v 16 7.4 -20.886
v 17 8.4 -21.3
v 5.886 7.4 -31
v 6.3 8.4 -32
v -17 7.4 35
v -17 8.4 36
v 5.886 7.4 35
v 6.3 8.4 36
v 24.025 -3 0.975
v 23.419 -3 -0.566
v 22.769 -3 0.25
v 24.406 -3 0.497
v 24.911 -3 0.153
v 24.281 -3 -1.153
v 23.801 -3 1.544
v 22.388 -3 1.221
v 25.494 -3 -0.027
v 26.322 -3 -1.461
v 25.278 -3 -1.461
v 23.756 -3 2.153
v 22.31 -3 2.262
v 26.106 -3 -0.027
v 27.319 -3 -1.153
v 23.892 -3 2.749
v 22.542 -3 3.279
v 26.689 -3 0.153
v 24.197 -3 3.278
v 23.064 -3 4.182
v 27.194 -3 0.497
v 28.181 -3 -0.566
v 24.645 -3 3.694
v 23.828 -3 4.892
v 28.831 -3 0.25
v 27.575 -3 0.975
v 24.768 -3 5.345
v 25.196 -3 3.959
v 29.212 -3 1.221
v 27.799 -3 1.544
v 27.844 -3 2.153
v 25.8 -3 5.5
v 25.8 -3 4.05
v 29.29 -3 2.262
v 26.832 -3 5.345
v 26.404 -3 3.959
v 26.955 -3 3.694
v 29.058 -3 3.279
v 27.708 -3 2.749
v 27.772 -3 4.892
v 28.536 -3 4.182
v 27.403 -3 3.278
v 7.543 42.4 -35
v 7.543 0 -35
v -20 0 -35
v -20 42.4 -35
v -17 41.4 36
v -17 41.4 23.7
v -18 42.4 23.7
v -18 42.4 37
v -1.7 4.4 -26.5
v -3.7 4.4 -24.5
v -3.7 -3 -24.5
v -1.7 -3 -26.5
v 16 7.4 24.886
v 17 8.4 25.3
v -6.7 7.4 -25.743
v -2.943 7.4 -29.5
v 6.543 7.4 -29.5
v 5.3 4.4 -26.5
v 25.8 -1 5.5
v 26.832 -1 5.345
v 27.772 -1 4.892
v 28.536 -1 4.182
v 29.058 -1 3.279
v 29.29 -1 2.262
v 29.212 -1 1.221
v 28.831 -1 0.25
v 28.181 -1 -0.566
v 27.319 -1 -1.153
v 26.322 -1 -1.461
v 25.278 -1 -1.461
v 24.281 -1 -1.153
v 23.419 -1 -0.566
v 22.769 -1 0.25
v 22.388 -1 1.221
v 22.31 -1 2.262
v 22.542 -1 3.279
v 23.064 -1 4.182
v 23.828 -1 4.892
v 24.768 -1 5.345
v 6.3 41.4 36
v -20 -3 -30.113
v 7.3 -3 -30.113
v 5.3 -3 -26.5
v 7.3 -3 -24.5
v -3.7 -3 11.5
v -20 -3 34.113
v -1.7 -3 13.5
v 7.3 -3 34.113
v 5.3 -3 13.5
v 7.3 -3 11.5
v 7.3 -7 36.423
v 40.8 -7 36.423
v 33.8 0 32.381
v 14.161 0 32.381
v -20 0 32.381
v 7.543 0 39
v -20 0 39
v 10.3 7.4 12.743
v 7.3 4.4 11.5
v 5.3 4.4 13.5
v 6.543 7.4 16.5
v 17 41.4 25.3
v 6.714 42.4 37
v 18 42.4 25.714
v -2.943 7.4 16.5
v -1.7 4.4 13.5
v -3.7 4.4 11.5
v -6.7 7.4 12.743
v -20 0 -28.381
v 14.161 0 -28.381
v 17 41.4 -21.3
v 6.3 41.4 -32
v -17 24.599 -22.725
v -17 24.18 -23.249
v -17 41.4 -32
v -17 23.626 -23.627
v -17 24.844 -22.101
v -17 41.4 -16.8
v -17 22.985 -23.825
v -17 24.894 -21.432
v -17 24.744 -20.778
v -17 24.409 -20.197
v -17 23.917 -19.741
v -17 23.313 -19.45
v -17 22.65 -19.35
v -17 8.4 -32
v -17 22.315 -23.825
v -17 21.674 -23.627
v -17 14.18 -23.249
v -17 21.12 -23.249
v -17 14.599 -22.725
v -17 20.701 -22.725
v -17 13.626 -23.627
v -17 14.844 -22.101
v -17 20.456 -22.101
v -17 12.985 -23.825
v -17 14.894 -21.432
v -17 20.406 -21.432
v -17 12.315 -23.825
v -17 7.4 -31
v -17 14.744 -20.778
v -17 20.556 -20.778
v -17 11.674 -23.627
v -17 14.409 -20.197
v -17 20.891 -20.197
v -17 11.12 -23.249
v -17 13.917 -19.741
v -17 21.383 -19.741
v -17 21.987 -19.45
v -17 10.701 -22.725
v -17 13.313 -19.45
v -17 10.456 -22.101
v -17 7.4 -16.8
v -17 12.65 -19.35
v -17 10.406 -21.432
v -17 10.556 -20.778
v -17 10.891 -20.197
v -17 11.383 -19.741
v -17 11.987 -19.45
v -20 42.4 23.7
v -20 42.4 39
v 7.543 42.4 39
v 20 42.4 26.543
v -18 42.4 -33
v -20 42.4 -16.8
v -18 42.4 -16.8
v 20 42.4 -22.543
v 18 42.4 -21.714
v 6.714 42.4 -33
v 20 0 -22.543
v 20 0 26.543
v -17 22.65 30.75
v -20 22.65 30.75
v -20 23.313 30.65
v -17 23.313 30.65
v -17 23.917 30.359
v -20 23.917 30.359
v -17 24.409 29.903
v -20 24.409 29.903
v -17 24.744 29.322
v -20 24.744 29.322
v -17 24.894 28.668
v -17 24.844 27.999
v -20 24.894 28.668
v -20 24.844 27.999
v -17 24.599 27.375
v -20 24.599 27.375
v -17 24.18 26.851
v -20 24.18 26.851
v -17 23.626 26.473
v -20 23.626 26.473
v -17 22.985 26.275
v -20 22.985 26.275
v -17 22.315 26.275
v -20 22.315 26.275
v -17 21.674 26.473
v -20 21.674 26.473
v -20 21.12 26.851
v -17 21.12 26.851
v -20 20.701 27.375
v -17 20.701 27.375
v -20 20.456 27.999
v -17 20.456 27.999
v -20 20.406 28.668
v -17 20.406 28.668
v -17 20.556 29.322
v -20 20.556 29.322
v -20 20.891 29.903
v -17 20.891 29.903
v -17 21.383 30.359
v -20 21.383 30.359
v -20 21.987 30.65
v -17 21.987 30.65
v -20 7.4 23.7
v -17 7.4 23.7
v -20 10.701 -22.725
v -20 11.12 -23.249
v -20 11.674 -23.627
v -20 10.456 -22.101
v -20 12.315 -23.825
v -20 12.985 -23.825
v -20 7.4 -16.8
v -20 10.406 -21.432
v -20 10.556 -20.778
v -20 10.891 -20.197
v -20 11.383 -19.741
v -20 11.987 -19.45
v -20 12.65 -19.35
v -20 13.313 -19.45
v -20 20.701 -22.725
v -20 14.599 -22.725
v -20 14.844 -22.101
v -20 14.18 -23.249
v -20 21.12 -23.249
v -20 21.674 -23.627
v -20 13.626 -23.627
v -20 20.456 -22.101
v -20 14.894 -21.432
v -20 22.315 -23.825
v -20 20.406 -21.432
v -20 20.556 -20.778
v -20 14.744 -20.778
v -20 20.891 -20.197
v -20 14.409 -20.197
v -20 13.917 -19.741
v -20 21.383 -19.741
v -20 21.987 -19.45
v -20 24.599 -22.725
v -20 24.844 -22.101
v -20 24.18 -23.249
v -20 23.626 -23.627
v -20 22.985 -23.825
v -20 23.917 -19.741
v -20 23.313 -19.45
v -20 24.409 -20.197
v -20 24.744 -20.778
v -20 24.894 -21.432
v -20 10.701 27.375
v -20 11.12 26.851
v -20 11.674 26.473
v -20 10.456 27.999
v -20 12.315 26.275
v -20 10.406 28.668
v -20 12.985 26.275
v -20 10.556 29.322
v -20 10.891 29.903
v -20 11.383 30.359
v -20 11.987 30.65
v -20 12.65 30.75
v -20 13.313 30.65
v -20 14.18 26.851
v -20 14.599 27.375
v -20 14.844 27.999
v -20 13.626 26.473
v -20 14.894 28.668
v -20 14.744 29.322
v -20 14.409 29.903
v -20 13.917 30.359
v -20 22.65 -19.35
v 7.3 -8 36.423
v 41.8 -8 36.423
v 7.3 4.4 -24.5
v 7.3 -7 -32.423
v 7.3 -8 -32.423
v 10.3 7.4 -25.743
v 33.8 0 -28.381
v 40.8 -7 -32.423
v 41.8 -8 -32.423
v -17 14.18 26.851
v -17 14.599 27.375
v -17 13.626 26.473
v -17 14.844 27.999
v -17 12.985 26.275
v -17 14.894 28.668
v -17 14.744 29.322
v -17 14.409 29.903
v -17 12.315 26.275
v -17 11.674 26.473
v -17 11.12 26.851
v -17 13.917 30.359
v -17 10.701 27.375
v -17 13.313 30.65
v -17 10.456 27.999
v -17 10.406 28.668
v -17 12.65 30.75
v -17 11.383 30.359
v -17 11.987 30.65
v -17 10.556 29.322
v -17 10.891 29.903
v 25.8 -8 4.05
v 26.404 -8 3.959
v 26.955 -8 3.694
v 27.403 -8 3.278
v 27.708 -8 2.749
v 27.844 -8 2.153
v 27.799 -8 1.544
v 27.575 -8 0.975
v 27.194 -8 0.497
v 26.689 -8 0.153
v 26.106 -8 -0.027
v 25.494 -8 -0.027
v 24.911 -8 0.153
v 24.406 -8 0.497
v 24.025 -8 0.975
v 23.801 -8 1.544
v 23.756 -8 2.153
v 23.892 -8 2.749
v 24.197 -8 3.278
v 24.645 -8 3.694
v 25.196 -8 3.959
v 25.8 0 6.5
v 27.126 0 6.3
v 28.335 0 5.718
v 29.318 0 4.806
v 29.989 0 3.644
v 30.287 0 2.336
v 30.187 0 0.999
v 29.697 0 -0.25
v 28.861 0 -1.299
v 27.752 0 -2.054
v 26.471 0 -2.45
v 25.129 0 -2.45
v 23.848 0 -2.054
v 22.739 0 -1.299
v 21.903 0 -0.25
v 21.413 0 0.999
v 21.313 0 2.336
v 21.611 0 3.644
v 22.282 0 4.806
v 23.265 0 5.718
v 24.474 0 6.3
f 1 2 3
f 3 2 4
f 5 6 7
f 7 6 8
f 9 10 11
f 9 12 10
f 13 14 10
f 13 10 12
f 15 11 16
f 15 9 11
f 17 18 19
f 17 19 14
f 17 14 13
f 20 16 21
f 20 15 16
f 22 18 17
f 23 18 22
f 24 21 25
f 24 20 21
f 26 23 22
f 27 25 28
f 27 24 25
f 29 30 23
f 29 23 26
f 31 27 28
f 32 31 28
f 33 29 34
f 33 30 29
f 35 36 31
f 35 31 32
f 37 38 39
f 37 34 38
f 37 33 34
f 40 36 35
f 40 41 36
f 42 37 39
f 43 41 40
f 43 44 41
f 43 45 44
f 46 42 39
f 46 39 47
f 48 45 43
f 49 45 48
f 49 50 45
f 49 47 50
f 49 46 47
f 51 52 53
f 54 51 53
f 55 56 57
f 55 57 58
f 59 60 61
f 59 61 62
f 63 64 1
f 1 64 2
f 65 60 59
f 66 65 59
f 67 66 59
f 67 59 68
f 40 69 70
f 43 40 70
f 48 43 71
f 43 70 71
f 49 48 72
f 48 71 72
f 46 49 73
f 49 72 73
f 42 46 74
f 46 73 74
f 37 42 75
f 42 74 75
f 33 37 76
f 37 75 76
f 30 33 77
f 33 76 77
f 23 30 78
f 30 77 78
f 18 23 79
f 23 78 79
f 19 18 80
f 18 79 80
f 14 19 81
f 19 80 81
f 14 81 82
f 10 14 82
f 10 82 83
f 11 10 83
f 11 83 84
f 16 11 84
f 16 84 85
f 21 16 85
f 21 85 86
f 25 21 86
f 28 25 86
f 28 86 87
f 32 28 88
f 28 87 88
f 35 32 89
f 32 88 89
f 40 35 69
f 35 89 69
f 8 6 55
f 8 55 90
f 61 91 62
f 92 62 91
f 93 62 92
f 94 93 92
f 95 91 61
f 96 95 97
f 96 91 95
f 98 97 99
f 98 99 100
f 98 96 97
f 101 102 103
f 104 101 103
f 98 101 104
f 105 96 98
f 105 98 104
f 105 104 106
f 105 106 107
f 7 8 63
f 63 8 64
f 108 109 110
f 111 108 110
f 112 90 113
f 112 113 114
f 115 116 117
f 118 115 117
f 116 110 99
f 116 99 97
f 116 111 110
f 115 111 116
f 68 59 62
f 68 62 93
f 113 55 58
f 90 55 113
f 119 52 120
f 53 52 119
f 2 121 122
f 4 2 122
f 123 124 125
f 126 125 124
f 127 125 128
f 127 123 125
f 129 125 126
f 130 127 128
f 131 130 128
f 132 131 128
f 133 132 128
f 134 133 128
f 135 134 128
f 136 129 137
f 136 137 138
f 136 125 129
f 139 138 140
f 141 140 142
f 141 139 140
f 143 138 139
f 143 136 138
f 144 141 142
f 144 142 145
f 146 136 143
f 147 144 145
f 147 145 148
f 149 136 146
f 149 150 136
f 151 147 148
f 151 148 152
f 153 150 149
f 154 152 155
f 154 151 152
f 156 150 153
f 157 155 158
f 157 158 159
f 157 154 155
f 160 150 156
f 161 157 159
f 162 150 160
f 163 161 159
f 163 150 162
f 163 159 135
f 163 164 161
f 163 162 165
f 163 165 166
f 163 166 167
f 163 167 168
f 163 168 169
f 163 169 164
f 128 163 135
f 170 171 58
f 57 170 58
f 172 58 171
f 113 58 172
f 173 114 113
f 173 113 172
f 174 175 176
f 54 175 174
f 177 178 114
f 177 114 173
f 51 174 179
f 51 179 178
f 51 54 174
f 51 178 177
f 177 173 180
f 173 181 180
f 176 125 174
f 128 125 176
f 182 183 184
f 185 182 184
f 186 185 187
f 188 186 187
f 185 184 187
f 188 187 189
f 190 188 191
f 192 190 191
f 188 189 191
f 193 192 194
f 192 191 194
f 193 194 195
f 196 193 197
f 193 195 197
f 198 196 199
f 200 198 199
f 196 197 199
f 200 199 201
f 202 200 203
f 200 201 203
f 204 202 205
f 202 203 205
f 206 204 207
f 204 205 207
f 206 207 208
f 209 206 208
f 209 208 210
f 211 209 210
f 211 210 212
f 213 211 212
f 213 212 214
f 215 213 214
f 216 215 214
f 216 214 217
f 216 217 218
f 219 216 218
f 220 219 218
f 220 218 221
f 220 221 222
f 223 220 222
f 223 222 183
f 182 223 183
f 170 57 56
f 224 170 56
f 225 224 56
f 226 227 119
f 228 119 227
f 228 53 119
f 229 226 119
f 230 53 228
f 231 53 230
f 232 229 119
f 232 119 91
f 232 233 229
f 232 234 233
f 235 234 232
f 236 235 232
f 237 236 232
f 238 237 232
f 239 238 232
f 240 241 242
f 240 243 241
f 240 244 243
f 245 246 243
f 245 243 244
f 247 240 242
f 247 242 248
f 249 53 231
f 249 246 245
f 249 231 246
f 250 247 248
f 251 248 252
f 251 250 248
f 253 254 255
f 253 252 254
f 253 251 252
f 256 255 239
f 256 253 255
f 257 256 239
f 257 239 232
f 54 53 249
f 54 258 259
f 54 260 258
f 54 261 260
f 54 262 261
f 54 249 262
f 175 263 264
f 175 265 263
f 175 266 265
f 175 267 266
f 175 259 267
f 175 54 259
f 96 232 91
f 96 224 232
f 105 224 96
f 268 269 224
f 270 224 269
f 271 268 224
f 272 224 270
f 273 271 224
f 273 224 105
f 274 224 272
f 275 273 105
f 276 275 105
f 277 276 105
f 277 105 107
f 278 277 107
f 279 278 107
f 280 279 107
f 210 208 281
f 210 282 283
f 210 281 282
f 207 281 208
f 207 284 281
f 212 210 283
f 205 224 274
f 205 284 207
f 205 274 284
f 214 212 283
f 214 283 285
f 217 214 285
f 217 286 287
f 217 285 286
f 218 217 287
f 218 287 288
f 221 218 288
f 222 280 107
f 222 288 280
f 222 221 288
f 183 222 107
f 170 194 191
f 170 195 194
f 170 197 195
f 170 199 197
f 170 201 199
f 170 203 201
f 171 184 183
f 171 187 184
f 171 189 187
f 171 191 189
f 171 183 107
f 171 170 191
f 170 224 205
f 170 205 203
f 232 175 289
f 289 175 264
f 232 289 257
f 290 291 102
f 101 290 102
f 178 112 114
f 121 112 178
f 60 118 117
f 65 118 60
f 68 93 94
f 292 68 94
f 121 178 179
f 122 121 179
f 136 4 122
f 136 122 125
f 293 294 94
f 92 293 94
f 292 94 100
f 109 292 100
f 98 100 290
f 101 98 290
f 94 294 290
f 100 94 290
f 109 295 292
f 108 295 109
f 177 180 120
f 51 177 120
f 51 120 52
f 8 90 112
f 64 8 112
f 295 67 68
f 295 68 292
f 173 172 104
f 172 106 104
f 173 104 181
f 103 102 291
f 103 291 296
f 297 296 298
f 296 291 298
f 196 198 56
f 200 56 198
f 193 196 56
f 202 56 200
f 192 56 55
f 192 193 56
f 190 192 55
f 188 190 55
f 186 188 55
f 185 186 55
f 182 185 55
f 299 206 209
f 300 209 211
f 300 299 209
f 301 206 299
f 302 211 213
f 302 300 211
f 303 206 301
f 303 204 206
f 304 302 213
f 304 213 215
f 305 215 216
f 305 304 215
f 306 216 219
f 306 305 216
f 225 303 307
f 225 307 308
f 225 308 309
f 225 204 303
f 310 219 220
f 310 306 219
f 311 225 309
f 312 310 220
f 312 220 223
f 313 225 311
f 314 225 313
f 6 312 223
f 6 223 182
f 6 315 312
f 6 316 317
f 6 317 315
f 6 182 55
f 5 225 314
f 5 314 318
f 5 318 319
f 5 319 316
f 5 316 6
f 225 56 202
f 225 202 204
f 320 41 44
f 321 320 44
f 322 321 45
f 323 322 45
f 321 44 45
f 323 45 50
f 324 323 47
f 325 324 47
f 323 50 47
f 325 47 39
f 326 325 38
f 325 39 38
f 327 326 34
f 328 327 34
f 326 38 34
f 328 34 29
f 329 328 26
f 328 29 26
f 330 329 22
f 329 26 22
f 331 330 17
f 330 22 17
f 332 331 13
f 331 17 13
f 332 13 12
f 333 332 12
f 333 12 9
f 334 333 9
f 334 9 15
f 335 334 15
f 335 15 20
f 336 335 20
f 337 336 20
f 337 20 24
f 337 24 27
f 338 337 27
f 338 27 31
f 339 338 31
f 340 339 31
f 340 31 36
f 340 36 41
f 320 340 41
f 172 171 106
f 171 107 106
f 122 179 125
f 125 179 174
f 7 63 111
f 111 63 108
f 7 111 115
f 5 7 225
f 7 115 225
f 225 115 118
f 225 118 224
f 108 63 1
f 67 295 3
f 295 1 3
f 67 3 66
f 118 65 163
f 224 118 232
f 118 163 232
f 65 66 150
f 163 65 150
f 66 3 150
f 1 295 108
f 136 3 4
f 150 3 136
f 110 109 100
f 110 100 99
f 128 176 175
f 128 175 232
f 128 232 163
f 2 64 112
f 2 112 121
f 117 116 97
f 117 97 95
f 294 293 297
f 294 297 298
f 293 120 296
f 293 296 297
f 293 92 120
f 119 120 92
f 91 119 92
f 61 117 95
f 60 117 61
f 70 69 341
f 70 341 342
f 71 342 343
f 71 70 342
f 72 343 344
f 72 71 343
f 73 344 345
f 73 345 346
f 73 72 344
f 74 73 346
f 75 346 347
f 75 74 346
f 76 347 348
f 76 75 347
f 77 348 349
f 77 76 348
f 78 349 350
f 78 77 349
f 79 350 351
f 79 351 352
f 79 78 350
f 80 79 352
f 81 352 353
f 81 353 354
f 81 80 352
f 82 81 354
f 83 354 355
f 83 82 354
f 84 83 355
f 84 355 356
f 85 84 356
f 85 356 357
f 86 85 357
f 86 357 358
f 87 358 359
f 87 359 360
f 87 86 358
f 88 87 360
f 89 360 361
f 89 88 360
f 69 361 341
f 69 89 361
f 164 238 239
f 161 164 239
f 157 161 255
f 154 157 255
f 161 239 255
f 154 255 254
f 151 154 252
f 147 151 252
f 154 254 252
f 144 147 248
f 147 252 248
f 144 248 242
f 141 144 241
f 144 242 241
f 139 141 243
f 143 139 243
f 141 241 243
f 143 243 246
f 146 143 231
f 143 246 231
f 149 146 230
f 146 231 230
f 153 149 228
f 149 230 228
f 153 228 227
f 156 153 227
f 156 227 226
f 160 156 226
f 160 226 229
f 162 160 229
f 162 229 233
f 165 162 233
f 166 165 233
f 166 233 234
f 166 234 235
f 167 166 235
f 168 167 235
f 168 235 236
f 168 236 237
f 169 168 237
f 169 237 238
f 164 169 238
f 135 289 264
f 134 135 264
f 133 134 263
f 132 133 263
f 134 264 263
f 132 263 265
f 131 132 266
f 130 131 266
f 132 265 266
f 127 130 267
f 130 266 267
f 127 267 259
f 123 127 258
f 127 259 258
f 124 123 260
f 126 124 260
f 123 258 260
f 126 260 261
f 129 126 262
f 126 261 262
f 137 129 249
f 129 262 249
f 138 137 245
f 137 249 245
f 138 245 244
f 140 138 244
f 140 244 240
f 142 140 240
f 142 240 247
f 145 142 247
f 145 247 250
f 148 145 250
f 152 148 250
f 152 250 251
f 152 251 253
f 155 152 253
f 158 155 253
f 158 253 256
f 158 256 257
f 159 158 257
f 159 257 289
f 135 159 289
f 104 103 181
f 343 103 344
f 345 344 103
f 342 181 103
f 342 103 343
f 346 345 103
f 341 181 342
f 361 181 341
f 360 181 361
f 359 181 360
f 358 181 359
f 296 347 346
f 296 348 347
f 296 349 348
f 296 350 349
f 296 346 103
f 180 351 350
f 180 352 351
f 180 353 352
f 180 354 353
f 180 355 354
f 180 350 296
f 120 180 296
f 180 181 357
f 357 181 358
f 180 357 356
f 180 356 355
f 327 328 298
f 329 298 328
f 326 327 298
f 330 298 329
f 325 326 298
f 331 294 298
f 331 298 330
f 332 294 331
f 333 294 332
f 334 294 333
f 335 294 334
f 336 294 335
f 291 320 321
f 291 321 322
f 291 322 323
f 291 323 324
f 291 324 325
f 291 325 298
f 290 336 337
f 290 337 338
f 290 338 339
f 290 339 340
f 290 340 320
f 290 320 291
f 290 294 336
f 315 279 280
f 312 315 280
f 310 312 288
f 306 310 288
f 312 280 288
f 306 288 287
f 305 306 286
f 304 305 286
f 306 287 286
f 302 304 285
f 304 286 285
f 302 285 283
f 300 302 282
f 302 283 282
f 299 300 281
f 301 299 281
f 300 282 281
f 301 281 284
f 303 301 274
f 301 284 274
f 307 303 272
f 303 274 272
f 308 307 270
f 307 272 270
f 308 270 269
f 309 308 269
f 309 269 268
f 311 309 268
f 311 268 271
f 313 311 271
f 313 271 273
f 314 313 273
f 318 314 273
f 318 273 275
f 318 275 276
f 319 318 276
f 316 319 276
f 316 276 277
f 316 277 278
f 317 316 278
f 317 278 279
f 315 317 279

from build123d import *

# Parameters (mm, degrees)
MAIN_FACE_EXTRUDE_DEPTH              = 7.4
MAIN_WALLS_EXTRUDE_DEPTH             = 35
MAIN_WALLS_LOWER_CHAMFER_SIZE        = 1
MAIN_WALLS_ENTRY_CHAMFER_SIZE        = 1
SKETCH4_W                            = 3
SKETCH4_H                            = 40.5
SERVO_MOUNT_CUT_DEPTH                = 35
SERVO_MOUNT_HOLES_REACH              = 72.134
SKETCH5_R                            = 2.25
MOUNT_DOVETAIL_DEPTH                 = 61.8
MOUNT_DOVETAIL_CHAMFER_SIZE          = 8
SKETCH9_W                            = 27.3
SKETCH9_H                            = 68.845299462
DOVETAIL_OFFSET_CUT_DEPTH            = 5
SKETCH10_R                           = 2.05
MOUNT_SCREW_HOLE_DEPTH               = 72.175838597
SKETCH11_R                           = 3.5
MOUNT_SCREW_COUNTERSINK_DEPTH        = 3
MOUNT_SCREW_COUNTERSINK_CHAMFER_SIZE = 1
GEAR_CUT_DEPTH                       = 68.031634323
GEAR_ENTRY_CHAMFER_SIZE              = 3


with BuildPart() as part:
    # Sketch1 → Main Face Extrude (new body)
    with BuildSketch(Plane(origin=(0, 0, 0), x_dir=(1, 0, 0), z_dir=(0, 1, 0))):
        Polygon((-20, 35), (7.542640687, 35), (20, 22.542640687), (20, -26.542640687), (7.542640687, -39), (-20, -39), align=None)
    extrude(amount=MAIN_FACE_EXTRUDE_DEPTH)

    # Sketch3 → Main Walls Extrude (add)
    with BuildSketch(Plane(origin=(0, 7.4, 0), x_dir=(1, 0, 0), z_dir=(0, 1, 0))):
        Polygon((-20, 35), (-20, -39), (7.542640687, -39), (20, -26.542640687), (20, 22.542640687), (7.542640687, 35), align=None)
        Polygon((-17, 32), (-17, -36), (6.3, -36), (17, -25.3), (17, 21.3), (6.3, 32), align=None, mode=Mode.SUBTRACT)
    extrude(amount=MAIN_WALLS_EXTRUDE_DEPTH)

    # Main Walls Lower Chamfer
    main_walls_lower_chamfer_edges = [part.edges().sort_by_distance(p)[0] for p in [
        (-5.35, 7.4, -32),
        (-5.35, 7.4, 36),
        (11.65, 7.4, 30.65),
        (17, 7.4, 2),
        (11.65, 7.4, -26.65),
    ]]
    chamfer(main_walls_lower_chamfer_edges, length=MAIN_WALLS_LOWER_CHAMFER_SIZE)

    # Main Walls Entry Chamfer
    main_walls_entry_chamfer_edges = [part.edges().sort_by_distance(p)[0] for p in [
        (-5.35, 42.4, -32),
        (-17, 42.4, 2),
        (-5.35, 42.4, 36),
        (11.65, 42.4, 30.65),
        (17, 42.4, 2),
        (11.65, 42.4, -26.65),
    ]]
    chamfer(main_walls_entry_chamfer_edges, length=MAIN_WALLS_ENTRY_CHAMFER_SIZE)

    # Sketch4 → Servo Mount Cut (cut)
    with BuildSketch(Plane(origin=(0, 42.4, 0), x_dir=(1, 0, 0), z_dir=(0, 1, 0))):
        with Locations((-18.5, -3.45)):
            Rectangle(SKETCH4_W, SKETCH4_H)
    extrude(amount=-SERVO_MOUNT_CUT_DEPTH, mode=Mode.SUBTRACT)

    # Sketch5 → Servo Mount Holes (cut, up to next)
    with BuildSketch(Plane.ZY.offset(20), mode=Mode.PRIVATE) as servo_mount_holes_sk1:
        with Locations((-21.6, 22.65)):
            Circle(SKETCH5_R)
    servo_mount_holes_tool1 = extrude(servo_mount_holes_sk1.sketch, amount=-SERVO_MOUNT_HOLES_REACH, mode=Mode.PRIVATE) & part.part
    # Sketch5 → Servo Mount Holes (cut, up to next)
    with BuildSketch(Plane.ZY.offset(20), mode=Mode.PRIVATE) as servo_mount_holes_sk2:
        with Locations((-21.6, 12.65)):
            Circle(SKETCH5_R)
    servo_mount_holes_tool2 = extrude(servo_mount_holes_sk2.sketch, amount=-SERVO_MOUNT_HOLES_REACH, mode=Mode.PRIVATE) & part.part
    # Sketch5 → Servo Mount Holes (cut, up to next)
    with BuildSketch(Plane.ZY.offset(20), mode=Mode.PRIVATE) as servo_mount_holes_sk3:
        with Locations((28.5, 22.65)):
            Circle(SKETCH5_R)
    servo_mount_holes_tool3 = extrude(servo_mount_holes_sk3.sketch, amount=-SERVO_MOUNT_HOLES_REACH, mode=Mode.PRIVATE) & part.part
    # Sketch5 → Servo Mount Holes (cut, up to next)
    with BuildSketch(Plane.ZY.offset(20), mode=Mode.PRIVATE) as servo_mount_holes_sk4:
        with Locations((28.5, 12.65)):
            Circle(SKETCH5_R)
    servo_mount_holes_tool4 = extrude(servo_mount_holes_sk4.sketch, amount=-SERVO_MOUNT_HOLES_REACH, mode=Mode.PRIVATE) & part.part
    add(servo_mount_holes_tool1.solids().sort_by_distance((-20, 22.65, -21.6))[0], mode=Mode.SUBTRACT)
    add(servo_mount_holes_tool2.solids().sort_by_distance((-20, 12.65, -21.6))[0], mode=Mode.SUBTRACT)
    add(servo_mount_holes_tool3.solids().sort_by_distance((-20, 22.65, 28.5))[0], mode=Mode.SUBTRACT)
    add(servo_mount_holes_tool4.solids().sort_by_distance((-20, 12.65, 28.5))[0], mode=Mode.SUBTRACT)

    # Sketch8 → Mount Dovetail (add)
    with BuildSketch(Plane.ZY.offset(20)):
        Polygon((-28.381197846, 0), (-32.422649731, -7), (-32.422649731, -8), (36.422649731, -8), (36.422649731, -7), (32.381197846, 0), align=None)
    extrude(amount=-MOUNT_DOVETAIL_DEPTH)

    # Mount Dovetail Chamfer
    mount_dovetail_chamfer_edges = [part.edges().sort_by_distance(p)[0] for p in [
        (41.8, 0, 2),
    ]]
    chamfer(mount_dovetail_chamfer_edges, length=MOUNT_DOVETAIL_CHAMFER_SIZE - 0.0001)  # a hair under: the kernel refuses the full size

    # Sketch9 → Dovetail Offset Cut (cut)
    with BuildSketch(Plane.XZ.offset(8)):
        with Locations((-6.35, 2)):
            Rectangle(SKETCH9_W, SKETCH9_H)
    extrude(amount=-DOVETAIL_OFFSET_CUT_DEPTH, mode=Mode.SUBTRACT)

    # Sketch10 → Mount Screw Hole (cut, through all)
    with BuildSketch(Plane(origin=(0, 0, 0), x_dir=(1, 0, 0), z_dir=(0, 1, 0))):
        with Locations(Location((25.8, -2, 0), (0, 0, 270))):
            Circle(SKETCH10_R)
    extrude(amount=-MOUNT_SCREW_HOLE_DEPTH, mode=Mode.SUBTRACT)

    # Sketch11 → Mount Screw Countersink (cut)
    with BuildSketch(Plane(origin=(0, 0, 0), x_dir=(1, 0, 0), z_dir=(0, 1, 0))):
        with Locations(Location((25.8, -2, 0), (0, 0, 270))):
            Circle(SKETCH11_R)
    extrude(amount=-MOUNT_SCREW_COUNTERSINK_DEPTH, mode=Mode.SUBTRACT)

    # Mount Screw Countersink Chamfer
    mount_screw_countersink_chamfer_edges = [part.edges().sort_by_distance(p)[0] for p in [
        (25.8, 0, -1.5),
    ]]
    chamfer(mount_screw_countersink_chamfer_edges, length=MOUNT_SCREW_COUNTERSINK_CHAMFER_SIZE)

    # Sketch2 → Gear Cut (cut, through all)
    with BuildSketch(Plane(origin=(0, 7.4, 0), x_dir=(1, 0, 0), z_dir=(0, 1, 0))):
        Polygon((-1.7, 26.5), (5.3, 26.5), (7.3, 24.5), (7.3, -11.5), (5.3, -13.5), (-1.7, -13.5), (-3.7, -11.5), (-3.7, 24.5), align=None)
    extrude(amount=-GEAR_CUT_DEPTH, mode=Mode.SUBTRACT)

    # Gear Entry Chamfer
    gear_entry_chamfer_edges = [part.edges().sort_by_distance(p)[0] for p in [
        (-2.7, 7.4, -25.5),
        (-3.7, 7.4, -6.5),
        (-2.7, 7.4, 12.5),
        (1.8, 7.4, 13.5),
        (6.3, 7.4, 12.5),
        (7.3, 7.4, -6.5),
        (6.3, 7.4, -25.5),
        (1.8, 7.4, -26.5),
    ]]
    chamfer(gear_entry_chamfer_edges, length=GEAR_ENTRY_CHAMFER_SIZE)


solid = part.part
